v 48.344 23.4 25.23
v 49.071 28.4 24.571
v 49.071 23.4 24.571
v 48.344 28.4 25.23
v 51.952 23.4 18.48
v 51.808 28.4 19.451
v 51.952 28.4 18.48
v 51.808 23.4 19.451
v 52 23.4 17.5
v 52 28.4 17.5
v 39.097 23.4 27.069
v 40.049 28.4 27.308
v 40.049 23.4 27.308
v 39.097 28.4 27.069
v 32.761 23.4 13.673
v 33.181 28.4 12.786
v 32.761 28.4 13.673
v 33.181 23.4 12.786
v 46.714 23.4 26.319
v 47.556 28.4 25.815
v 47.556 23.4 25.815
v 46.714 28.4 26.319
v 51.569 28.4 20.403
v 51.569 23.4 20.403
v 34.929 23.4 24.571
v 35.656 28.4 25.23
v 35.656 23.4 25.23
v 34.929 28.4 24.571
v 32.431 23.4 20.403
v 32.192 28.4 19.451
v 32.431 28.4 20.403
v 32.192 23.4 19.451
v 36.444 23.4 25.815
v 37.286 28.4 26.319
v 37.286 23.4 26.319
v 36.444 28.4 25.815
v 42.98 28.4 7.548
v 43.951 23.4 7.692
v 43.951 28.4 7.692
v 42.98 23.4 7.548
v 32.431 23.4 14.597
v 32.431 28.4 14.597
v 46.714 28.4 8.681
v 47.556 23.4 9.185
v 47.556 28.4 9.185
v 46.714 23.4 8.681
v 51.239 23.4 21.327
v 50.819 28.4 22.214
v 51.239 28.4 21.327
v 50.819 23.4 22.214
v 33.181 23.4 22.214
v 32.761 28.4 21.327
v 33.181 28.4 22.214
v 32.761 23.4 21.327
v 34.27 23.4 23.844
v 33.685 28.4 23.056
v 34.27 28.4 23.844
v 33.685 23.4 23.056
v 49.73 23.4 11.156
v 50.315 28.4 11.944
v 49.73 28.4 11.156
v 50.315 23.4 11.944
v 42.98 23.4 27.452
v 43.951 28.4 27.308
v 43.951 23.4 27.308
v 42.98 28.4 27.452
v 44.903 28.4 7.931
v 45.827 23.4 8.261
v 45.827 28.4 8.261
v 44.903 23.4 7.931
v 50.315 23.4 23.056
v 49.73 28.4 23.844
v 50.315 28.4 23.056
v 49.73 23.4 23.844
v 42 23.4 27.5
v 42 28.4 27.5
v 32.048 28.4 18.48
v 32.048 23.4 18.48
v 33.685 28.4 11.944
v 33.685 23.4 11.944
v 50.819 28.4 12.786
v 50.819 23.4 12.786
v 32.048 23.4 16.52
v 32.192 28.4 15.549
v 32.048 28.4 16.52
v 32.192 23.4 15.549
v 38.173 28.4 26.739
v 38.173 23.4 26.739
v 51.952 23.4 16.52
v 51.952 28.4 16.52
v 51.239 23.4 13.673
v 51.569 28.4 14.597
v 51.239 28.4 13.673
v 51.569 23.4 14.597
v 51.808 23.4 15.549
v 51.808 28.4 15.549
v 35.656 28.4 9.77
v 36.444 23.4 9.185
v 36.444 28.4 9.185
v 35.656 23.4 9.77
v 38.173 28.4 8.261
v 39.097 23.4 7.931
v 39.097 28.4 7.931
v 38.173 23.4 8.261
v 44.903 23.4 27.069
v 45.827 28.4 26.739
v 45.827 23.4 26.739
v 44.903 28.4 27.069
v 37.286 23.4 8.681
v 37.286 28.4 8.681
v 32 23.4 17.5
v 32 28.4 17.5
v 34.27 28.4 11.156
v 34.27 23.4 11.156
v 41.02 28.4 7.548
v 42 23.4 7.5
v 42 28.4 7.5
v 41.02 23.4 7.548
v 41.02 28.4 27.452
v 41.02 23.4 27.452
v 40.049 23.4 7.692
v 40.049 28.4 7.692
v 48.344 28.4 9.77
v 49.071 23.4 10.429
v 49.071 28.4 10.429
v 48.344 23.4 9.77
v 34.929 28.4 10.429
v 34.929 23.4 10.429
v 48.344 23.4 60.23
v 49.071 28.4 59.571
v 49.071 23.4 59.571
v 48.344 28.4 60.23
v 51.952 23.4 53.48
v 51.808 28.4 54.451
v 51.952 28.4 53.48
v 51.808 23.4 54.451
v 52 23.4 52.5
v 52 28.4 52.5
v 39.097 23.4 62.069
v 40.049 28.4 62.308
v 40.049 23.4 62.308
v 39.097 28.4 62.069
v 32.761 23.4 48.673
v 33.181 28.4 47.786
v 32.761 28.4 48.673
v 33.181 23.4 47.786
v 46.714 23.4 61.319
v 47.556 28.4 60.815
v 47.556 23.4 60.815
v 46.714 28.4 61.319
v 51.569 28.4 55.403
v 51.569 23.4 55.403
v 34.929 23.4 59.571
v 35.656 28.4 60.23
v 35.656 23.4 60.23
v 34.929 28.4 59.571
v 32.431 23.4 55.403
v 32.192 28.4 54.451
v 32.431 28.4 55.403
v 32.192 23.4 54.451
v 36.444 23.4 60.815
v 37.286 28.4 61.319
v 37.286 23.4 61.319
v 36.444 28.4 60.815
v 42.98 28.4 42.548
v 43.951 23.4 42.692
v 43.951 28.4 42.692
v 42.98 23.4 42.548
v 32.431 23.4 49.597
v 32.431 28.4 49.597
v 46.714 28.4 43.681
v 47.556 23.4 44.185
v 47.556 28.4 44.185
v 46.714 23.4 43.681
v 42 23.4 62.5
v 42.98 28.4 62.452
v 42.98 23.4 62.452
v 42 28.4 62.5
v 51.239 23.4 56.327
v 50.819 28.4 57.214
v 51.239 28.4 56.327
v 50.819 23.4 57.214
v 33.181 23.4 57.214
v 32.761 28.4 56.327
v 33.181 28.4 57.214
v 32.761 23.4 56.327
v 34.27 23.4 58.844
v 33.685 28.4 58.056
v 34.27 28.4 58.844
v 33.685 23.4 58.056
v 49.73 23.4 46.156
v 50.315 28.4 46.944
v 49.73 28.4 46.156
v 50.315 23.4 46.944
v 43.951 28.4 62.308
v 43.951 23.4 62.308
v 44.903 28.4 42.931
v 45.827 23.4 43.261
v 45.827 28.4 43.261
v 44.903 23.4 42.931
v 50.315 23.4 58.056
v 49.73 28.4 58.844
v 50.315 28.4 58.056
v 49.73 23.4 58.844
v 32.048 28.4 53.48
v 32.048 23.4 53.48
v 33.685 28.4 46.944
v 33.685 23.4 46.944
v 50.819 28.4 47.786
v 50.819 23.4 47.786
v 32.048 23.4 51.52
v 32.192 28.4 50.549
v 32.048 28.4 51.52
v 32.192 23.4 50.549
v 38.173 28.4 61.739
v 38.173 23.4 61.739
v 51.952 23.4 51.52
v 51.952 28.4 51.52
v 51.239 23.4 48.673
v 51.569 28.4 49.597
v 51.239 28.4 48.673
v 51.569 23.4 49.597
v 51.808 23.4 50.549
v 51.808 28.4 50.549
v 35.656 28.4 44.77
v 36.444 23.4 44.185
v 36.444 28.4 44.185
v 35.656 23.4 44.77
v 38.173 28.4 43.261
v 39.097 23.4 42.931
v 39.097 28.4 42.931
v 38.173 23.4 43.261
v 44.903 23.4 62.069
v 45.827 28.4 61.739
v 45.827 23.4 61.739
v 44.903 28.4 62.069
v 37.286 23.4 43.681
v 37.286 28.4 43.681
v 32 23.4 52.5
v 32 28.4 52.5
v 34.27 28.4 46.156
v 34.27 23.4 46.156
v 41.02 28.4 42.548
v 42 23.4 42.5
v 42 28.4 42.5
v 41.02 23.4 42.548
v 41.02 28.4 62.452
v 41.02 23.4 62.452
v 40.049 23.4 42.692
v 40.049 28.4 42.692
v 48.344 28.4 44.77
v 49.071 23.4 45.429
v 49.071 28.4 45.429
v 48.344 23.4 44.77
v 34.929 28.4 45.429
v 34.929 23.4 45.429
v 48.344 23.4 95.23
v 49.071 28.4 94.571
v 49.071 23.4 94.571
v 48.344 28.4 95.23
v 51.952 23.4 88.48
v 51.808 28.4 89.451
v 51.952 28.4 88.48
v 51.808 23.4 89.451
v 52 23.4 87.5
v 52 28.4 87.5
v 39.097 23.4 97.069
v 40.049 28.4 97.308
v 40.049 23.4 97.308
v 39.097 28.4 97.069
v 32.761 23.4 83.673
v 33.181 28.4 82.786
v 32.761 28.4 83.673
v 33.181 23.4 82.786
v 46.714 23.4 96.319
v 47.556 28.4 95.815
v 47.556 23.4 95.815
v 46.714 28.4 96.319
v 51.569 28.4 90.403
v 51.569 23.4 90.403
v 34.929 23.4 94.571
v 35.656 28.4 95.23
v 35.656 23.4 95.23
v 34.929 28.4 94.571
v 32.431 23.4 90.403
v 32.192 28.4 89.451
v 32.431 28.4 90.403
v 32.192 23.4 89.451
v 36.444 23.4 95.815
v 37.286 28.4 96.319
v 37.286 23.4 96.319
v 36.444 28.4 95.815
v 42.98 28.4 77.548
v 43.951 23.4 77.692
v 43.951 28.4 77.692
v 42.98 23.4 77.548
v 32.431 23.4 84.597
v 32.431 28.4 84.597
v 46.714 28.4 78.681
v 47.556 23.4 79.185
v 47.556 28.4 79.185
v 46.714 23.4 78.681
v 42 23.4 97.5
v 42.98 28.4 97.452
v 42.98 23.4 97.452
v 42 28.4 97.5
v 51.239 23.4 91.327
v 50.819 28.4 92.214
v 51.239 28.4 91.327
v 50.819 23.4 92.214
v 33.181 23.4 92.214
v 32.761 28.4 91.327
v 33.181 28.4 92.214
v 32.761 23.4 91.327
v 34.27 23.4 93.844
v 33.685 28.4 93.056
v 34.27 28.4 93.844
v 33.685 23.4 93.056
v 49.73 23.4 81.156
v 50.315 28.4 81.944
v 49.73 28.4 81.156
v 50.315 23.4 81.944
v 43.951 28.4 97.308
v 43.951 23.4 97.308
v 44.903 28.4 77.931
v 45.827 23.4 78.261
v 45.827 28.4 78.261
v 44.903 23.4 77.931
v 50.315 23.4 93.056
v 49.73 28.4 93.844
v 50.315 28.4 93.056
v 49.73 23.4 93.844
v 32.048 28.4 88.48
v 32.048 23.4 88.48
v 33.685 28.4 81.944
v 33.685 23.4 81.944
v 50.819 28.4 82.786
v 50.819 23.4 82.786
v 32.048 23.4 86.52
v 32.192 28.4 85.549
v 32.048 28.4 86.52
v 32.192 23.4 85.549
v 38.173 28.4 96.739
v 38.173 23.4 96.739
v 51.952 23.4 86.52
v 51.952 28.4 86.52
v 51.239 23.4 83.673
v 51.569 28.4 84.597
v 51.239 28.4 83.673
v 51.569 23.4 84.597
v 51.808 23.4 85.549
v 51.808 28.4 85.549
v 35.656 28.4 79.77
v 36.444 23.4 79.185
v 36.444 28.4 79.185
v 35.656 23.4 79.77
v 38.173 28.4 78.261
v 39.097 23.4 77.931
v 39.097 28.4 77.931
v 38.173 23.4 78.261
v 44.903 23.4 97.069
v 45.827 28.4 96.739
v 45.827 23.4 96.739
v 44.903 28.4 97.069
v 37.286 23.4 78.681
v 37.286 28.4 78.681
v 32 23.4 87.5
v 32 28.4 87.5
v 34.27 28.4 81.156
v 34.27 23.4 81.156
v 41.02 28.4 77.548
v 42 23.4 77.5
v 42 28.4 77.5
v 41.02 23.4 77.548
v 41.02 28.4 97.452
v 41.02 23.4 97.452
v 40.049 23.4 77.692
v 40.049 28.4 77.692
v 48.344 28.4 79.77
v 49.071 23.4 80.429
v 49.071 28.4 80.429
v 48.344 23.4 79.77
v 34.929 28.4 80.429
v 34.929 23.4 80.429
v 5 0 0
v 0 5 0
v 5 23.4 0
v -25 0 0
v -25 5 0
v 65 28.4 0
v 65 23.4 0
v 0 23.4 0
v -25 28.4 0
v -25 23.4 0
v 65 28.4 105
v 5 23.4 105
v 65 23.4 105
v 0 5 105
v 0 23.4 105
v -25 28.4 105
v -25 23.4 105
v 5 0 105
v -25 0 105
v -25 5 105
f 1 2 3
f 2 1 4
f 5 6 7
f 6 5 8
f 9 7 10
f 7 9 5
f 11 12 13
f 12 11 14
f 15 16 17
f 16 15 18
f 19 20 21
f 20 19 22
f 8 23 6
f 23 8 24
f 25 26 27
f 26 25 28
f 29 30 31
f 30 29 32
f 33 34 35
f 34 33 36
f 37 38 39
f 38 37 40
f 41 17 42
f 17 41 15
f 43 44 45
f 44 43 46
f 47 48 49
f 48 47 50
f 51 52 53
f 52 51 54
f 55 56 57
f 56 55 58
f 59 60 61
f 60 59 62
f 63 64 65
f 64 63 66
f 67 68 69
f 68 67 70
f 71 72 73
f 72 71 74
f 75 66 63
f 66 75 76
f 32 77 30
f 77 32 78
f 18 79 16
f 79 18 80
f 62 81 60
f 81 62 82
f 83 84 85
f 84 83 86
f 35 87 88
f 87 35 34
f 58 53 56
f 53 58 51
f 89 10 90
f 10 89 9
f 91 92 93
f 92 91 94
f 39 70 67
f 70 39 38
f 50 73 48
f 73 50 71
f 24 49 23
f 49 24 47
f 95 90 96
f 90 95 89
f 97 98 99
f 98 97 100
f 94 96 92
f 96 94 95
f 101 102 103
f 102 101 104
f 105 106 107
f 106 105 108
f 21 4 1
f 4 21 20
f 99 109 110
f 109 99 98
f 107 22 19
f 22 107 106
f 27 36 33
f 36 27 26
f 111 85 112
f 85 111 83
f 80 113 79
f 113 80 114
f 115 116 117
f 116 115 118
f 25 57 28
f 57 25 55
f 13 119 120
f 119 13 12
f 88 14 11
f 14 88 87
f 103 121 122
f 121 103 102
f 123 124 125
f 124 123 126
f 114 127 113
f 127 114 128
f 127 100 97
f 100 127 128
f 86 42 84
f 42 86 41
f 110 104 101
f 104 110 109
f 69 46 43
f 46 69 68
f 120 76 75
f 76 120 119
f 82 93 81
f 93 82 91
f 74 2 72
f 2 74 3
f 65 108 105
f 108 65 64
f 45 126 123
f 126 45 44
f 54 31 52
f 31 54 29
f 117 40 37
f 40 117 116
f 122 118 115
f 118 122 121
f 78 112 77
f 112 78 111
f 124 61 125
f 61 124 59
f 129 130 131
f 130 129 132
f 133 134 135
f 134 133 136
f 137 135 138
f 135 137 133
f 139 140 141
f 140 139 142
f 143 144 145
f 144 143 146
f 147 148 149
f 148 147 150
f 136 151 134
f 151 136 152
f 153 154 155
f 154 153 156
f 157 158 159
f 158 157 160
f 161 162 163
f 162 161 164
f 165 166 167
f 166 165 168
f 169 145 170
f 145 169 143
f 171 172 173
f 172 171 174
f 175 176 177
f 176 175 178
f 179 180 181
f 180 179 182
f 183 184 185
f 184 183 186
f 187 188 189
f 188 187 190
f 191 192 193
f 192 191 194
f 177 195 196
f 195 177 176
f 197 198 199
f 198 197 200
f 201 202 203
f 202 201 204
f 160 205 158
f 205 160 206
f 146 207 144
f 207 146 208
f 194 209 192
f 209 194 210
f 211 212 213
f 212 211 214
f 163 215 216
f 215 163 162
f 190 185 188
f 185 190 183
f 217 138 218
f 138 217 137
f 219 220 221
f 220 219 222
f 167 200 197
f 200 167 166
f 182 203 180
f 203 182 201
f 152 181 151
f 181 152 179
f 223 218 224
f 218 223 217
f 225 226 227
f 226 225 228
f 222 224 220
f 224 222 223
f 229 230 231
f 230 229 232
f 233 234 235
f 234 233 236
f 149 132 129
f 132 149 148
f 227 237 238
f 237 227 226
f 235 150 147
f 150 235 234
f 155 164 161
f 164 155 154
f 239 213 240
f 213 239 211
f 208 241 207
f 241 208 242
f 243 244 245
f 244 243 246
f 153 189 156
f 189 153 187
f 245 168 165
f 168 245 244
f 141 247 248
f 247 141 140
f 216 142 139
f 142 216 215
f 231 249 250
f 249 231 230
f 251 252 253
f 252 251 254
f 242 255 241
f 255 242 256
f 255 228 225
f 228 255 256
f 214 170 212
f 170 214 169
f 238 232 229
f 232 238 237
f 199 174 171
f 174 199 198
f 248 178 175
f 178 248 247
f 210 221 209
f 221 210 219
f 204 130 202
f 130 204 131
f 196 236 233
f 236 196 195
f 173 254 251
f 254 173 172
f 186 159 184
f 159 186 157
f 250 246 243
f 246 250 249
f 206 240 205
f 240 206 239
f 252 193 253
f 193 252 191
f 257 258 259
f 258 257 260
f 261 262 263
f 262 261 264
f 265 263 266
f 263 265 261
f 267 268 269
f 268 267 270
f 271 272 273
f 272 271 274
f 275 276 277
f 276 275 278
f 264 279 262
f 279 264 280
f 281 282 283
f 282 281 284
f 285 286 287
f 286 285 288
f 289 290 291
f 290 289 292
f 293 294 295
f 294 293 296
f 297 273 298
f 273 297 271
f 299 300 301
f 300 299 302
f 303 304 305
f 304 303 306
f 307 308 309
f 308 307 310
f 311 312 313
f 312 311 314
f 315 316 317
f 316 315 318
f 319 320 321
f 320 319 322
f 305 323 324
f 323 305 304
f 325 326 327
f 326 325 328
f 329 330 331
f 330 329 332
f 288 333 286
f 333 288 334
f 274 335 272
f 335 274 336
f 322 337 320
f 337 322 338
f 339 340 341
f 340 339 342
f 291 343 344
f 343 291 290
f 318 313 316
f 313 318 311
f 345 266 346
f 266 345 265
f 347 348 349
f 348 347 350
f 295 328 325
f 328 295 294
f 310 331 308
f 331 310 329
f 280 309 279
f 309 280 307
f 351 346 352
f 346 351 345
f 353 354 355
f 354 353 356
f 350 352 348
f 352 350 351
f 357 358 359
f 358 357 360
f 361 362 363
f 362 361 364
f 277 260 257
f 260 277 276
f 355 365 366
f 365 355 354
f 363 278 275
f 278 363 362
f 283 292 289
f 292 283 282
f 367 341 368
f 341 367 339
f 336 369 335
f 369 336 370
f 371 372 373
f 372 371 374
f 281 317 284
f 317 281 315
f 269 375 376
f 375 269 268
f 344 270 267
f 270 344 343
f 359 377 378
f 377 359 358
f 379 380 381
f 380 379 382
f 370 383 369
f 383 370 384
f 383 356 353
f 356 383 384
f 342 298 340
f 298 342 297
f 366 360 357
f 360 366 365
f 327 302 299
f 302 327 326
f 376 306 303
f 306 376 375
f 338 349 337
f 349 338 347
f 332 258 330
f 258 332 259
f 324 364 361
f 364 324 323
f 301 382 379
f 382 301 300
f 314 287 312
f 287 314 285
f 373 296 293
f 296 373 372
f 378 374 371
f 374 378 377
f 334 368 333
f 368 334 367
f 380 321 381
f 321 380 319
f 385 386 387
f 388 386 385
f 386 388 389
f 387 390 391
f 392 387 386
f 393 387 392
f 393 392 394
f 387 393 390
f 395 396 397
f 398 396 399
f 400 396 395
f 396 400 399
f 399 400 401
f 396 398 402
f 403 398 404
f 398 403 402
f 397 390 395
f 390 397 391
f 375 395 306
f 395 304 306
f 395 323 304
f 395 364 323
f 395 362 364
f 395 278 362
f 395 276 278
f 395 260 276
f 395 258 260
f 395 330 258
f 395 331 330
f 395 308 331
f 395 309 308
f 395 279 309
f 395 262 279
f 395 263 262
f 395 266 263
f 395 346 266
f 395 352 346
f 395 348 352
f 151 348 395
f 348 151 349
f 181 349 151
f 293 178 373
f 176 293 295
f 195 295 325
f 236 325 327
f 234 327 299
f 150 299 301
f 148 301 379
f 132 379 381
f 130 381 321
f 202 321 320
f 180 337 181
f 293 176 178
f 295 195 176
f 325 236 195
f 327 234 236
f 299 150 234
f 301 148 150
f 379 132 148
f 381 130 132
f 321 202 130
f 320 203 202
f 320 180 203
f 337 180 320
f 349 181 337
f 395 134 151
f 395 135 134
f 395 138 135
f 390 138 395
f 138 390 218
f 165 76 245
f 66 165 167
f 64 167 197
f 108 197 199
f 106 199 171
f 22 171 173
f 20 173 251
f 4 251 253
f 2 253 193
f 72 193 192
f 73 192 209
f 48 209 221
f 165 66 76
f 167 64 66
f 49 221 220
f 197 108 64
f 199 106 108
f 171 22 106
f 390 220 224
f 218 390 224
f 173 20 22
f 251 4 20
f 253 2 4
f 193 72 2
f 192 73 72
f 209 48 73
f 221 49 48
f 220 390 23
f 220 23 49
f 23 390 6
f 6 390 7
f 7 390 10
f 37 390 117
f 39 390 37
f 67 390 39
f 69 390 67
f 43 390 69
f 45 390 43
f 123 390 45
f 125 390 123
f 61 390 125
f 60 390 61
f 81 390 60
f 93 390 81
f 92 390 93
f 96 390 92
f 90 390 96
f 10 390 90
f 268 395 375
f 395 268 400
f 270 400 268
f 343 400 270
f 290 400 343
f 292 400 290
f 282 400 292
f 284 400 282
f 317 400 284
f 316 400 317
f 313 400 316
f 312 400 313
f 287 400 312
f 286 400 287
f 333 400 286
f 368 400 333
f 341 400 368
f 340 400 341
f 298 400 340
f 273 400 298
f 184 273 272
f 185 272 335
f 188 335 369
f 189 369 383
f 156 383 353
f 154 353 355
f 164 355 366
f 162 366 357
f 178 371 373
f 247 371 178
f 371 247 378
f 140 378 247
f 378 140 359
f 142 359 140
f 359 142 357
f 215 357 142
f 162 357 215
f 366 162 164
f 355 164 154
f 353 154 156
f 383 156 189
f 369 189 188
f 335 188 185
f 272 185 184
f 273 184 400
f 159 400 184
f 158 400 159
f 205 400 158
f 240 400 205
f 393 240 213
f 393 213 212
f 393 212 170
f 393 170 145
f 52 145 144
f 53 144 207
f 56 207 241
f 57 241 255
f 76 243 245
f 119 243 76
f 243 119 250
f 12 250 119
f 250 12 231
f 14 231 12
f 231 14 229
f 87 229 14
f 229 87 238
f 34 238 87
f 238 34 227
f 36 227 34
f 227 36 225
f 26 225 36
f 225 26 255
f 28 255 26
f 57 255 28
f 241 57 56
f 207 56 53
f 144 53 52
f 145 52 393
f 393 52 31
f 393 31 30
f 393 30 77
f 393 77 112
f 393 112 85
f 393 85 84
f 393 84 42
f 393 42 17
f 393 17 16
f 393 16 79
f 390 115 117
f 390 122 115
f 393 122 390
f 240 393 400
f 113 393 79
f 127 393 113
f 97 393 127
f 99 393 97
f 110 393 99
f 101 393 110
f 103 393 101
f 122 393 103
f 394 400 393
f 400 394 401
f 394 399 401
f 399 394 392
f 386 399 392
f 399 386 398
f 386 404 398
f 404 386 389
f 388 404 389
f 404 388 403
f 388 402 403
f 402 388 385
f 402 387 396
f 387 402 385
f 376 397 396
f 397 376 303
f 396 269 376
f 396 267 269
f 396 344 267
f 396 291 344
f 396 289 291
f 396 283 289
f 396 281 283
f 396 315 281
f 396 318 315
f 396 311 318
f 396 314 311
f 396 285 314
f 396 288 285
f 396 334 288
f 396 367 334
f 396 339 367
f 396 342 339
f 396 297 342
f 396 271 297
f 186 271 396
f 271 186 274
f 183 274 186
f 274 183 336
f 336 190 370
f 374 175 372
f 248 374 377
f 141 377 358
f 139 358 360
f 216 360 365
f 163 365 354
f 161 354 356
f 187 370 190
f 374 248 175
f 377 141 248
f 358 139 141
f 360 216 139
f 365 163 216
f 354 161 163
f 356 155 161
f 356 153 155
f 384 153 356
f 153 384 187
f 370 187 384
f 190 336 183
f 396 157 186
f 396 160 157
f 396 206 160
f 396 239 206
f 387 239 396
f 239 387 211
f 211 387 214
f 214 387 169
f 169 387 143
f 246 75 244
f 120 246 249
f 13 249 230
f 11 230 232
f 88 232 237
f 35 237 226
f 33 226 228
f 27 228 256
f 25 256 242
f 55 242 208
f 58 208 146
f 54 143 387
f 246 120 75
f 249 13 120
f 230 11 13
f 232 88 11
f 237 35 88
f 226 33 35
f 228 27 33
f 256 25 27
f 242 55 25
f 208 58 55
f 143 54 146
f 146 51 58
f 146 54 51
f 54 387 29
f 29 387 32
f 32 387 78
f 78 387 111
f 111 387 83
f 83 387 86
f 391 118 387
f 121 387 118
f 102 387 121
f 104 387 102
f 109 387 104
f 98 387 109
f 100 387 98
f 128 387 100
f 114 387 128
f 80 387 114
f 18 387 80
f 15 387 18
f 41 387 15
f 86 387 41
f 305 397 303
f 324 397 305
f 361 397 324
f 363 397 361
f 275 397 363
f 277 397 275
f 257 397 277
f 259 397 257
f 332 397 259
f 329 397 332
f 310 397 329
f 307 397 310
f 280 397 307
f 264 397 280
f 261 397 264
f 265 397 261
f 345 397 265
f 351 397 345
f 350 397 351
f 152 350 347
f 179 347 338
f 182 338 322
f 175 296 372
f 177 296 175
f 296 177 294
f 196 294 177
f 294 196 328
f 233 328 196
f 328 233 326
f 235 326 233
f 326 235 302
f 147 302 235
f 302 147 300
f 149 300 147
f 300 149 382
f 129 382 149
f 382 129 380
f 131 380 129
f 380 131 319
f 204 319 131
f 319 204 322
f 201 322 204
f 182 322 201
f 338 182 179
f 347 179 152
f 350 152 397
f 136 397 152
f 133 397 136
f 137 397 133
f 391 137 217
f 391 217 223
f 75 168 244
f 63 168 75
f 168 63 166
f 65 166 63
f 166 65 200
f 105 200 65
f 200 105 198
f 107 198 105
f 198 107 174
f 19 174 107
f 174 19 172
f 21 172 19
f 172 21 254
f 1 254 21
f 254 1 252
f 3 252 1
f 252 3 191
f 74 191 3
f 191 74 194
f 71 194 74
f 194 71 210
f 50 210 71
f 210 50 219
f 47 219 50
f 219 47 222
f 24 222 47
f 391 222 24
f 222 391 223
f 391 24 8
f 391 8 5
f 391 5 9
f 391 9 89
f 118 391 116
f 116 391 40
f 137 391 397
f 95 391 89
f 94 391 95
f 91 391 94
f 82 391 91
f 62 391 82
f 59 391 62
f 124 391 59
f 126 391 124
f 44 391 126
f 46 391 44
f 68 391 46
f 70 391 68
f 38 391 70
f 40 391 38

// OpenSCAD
// Dimensions (mm)
shelf_thickness = 18;
extrusion_length = 105;

// Profile dimensions
spine_x_min = 0;
spine_x_max = 5;
spine_y_min = 0;
spine_y_max = 28.4;

bottom_jaw_x_min = -25;
bottom_jaw_x_max = 5;
bottom_jaw_y_min = 0;
bottom_jaw_y_max = 5;

top_jaw_arm_x_min = -25;
top_jaw_arm_x_max = 65;
top_jaw_arm_y_min = 23.4;
top_jaw_arm_y_max = 28.4;

// Hole parameters
hole_diameter = 20;
hole_radius = hole_diameter / 2;
hole_x = 42;
hole_z_positions = [17.5, 52.5, 87.5];

$fn = 64;

// Build the part
difference() {
    // Main body: extrude the C-shaped profile along Z
    linear_extrude(height = extrusion_length, convexity = 10) {
        union() {
            // Spine
            square([spine_x_max - spine_x_min, spine_y_max - spine_y_min], center = false);
            translate([spine_x_min, spine_y_min])
                square([spine_x_max - spine_x_min, spine_y_max - spine_y_min]);

            // Bottom jaw
            translate([bottom_jaw_x_min, bottom_jaw_y_min])
                square([bottom_jaw_x_max - bottom_jaw_x_min, bottom_jaw_y_max - bottom_jaw_y_min]);

            // Top jaw and arm
            translate([top_jaw_arm_x_min, top_jaw_arm_y_min])
                square([top_jaw_arm_x_max - top_jaw_arm_x_min, top_jaw_arm_y_max - top_jaw_arm_y_min]);
        }
    }

    // Three holes through the arm along Z
    for (z_pos = hole_z_positions) {
        translate([hole_x, 0, z_pos])
            rotate([90, 0, 0])
            cylinder(r = hole_radius, h = extrusion_length + 2, center = true);
    }
}
